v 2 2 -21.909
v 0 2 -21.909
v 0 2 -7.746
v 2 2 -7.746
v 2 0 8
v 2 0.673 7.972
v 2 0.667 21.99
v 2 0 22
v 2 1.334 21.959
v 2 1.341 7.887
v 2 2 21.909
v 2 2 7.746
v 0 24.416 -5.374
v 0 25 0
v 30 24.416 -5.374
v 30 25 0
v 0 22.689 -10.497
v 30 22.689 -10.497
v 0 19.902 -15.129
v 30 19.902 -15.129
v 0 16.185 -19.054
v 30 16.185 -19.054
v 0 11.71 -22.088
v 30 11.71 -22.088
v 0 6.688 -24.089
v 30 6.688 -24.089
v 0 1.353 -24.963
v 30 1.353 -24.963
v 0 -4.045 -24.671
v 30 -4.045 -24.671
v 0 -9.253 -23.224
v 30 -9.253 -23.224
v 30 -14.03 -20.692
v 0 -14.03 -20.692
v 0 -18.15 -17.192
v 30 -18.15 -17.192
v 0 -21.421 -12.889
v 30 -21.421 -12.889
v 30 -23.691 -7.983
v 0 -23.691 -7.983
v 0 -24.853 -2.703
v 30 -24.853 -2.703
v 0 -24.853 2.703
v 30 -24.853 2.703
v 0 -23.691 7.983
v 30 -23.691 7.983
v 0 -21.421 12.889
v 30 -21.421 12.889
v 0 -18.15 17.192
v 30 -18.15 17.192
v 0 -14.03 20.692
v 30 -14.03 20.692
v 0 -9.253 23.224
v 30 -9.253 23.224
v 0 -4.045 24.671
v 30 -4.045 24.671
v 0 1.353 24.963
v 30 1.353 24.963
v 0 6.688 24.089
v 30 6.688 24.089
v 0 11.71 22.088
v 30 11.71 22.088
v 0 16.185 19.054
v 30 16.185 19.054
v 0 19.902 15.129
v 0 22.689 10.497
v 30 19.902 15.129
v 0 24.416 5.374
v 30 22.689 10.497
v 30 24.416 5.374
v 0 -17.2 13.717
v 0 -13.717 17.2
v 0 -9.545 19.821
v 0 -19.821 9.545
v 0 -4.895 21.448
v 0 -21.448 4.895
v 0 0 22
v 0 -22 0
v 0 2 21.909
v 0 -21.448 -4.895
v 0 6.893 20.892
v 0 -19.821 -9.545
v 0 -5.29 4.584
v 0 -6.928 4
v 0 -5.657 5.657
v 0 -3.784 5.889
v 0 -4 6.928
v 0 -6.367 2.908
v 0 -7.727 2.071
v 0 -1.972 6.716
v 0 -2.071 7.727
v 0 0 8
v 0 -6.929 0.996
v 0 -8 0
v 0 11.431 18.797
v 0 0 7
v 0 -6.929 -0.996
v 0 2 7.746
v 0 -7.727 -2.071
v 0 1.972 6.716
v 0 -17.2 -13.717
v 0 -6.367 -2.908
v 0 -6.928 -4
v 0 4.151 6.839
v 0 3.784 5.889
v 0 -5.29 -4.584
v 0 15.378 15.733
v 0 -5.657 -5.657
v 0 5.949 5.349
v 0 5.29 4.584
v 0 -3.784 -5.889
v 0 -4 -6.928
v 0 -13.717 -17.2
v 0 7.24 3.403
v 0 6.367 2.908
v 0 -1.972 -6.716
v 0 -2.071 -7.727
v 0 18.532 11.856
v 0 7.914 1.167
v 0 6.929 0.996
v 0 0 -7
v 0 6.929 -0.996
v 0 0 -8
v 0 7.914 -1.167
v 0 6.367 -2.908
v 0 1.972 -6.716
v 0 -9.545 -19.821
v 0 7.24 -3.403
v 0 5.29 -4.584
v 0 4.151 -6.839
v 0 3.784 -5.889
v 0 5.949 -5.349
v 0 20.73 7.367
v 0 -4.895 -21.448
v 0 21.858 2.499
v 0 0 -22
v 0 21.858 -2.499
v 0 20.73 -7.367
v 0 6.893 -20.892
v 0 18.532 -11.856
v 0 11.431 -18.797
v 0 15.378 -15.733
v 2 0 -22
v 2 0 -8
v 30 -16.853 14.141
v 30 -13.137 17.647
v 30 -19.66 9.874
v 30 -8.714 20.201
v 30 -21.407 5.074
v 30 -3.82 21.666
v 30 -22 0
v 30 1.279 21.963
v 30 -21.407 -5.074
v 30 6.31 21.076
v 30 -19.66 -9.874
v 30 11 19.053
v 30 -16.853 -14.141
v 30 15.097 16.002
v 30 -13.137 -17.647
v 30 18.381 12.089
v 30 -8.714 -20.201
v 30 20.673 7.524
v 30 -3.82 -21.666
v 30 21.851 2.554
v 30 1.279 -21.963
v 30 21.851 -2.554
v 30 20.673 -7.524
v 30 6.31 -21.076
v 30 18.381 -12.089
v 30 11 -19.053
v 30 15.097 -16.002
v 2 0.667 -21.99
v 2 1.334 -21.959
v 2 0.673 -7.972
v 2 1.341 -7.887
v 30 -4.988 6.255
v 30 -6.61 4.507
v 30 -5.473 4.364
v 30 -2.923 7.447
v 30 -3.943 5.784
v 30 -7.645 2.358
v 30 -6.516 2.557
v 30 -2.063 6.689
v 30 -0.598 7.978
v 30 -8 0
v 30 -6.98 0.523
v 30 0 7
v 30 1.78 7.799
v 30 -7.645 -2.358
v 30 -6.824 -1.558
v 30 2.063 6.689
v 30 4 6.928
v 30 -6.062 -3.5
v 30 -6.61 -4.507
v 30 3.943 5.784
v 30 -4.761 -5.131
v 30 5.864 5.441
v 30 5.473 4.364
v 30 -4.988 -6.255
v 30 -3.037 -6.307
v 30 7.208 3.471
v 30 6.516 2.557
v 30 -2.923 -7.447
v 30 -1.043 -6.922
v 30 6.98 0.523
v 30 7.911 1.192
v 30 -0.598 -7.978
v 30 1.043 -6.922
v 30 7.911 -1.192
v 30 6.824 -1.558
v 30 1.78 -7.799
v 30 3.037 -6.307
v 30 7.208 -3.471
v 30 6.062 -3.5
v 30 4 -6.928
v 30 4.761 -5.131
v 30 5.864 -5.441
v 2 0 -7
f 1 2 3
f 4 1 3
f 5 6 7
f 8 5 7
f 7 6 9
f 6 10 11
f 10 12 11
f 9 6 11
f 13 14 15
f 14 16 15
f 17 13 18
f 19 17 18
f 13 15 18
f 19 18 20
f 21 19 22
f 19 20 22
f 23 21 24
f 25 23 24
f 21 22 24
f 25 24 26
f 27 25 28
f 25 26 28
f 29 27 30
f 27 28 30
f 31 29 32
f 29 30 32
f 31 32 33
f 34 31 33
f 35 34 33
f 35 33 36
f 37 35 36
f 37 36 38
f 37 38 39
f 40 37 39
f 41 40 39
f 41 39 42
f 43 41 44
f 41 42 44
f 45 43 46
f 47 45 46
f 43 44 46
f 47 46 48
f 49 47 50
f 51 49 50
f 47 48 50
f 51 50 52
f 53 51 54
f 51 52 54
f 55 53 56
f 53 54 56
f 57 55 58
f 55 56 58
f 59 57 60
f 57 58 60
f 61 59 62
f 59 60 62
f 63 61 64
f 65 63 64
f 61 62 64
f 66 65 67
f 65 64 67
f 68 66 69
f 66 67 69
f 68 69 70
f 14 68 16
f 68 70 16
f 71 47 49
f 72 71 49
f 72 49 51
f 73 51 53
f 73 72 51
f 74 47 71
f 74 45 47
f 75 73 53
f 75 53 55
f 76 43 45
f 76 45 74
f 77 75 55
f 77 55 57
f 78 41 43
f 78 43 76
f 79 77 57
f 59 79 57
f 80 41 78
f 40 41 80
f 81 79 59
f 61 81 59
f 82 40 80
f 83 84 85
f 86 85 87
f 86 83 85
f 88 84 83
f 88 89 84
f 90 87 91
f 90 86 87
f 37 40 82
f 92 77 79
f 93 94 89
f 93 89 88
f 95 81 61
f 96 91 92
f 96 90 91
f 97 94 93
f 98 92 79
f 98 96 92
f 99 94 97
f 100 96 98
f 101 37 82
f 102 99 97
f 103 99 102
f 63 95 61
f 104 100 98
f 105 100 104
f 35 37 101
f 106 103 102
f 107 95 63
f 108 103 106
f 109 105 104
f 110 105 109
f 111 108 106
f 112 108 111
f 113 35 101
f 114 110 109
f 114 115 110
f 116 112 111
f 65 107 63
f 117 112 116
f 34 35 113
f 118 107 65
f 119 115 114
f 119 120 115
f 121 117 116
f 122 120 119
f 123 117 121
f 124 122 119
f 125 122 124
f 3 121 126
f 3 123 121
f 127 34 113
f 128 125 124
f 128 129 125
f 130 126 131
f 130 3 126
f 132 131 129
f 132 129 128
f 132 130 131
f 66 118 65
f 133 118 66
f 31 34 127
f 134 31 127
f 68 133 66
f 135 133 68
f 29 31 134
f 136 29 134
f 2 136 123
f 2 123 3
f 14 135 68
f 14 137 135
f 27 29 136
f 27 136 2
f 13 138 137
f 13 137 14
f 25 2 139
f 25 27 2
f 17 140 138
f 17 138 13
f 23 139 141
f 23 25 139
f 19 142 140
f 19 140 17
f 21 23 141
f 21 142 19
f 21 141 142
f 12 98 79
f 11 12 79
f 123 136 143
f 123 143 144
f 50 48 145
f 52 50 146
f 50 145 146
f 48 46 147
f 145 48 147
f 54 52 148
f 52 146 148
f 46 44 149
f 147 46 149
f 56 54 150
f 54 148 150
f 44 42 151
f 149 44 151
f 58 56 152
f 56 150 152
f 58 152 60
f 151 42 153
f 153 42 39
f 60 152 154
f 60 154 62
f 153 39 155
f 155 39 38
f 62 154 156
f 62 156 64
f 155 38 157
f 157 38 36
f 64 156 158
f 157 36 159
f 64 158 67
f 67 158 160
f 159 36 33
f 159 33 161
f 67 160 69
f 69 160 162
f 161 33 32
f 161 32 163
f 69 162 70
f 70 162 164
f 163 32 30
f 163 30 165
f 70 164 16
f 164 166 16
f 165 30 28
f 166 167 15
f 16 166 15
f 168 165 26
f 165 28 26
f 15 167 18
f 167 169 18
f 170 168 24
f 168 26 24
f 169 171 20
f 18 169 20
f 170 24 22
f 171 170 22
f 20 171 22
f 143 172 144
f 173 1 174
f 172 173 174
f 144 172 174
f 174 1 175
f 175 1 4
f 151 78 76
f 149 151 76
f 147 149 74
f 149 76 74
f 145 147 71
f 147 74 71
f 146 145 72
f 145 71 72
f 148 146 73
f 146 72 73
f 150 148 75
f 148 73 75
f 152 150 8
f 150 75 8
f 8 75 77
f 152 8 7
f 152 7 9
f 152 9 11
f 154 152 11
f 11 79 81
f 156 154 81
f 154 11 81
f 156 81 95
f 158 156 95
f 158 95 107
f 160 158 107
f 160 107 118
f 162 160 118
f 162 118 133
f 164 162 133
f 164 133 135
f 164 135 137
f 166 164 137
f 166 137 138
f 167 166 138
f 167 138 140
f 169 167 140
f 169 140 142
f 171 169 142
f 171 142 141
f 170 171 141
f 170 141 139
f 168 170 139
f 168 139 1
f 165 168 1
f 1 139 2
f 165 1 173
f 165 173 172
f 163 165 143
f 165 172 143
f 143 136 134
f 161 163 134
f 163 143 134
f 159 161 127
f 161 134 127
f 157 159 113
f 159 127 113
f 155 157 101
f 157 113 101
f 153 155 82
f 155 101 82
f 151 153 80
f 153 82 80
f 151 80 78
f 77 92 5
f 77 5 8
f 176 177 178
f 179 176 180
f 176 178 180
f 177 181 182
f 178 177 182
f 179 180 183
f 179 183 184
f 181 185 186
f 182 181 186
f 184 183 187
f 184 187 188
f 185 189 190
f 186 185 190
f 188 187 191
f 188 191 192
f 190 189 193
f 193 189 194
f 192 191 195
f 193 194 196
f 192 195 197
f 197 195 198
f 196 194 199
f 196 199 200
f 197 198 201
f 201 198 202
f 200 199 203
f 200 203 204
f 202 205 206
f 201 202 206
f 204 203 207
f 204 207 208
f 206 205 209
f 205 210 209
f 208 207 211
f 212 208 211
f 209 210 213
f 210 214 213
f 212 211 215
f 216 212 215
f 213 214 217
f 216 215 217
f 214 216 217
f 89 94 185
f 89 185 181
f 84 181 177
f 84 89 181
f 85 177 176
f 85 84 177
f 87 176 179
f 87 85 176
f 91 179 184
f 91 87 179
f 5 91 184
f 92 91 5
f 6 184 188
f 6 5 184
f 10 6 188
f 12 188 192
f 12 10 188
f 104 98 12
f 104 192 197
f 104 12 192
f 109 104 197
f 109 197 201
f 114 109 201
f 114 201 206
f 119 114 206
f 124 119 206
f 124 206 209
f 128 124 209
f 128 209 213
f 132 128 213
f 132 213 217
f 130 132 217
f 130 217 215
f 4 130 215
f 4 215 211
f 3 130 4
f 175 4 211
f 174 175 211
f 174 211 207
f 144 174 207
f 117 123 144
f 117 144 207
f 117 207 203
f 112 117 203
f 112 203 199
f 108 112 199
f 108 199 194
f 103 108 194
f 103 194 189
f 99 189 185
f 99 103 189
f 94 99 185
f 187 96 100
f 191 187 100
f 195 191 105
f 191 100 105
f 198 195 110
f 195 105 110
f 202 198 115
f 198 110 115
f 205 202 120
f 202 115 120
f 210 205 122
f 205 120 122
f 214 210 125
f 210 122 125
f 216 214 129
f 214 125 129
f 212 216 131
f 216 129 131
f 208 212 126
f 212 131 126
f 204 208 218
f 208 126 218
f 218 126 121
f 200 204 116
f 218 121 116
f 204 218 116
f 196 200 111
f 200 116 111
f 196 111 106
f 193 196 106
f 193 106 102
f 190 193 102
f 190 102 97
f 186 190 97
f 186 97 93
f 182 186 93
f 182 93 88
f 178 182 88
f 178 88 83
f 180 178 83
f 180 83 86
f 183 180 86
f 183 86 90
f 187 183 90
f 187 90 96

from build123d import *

# Parameters (mm, degrees)
ESBO_O1_W                = 30
ESBO_O1_H                = 25
ESBO_O2_R                = 7
CORTE_EXTRUS_O1_DEPTH    = 47.368092477
ESBO_O5_R                = 22
ESBO_O5_R_2              = 8
CORTE_EXTRUS_O3_DEPTH    = 47.368092477
ESBO_O6_W                = 15
ESBO_O6_H                = 2
RESSALTO_EXTRUS_O2_DEPTH = 2


with BuildPart() as part:
    # Esboço1 → Revolução1 (revolve)
    with BuildSketch(Plane.XY, mode=Mode.PRIVATE) as revolu_o1_sk:
        with Locations((15, -12.5)):
            Rectangle(ESBO_O1_W, ESBO_O1_H)
    revolve(revolu_o1_sk.sketch.rotate(Axis((30, 0, 0), (-1, 0, 0)), 180), axis=Axis((30, 0, 0), (-1, 0, 0)))

    # Esboço2 → Corte-extrusão1 (cut, through all)
    with BuildSketch(Plane.ZY):
        Circle(ESBO_O2_R)
    extrude(amount=-CORTE_EXTRUS_O1_DEPTH, mode=Mode.SUBTRACT)

    # Esboço5 → Corte-extrusão3 (cut, through all)
    with BuildSketch(Plane.ZY):
        with Locations(Location((0, 0, 0), (0, 0, 270))):
            Circle(ESBO_O5_R)
        with Locations(Location((0, 0, 0), (0, 0, 270))):
            Circle(ESBO_O5_R_2, mode=Mode.SUBTRACT)
    extrude(amount=-CORTE_EXTRUS_O3_DEPTH, mode=Mode.SUBTRACT)


with BuildPart() as corte_extrus_o3_piece_1:
    # of the separate pieces the step leaves, piece 1, a body of its own (corte_extrus_o3_pieces)
    add(part.part.solids().sort_by_distance((0, 25, 0))[0])



with BuildPart() as corte_extrus_o3_piece_2:
    # of the separate pieces the step leaves, piece 2, a body of its own (corte_extrus_o3_pieces)
    add(part.part.solids().sort_by_distance((0, -8, 0))[0])


with BuildPart() as corte_extrus_o3_piece_1_1:
    add(corte_extrus_o3_piece_1.part)

    add(corte_extrus_o3_piece_2.part)  # Ressalto-extrusão2 merges Corte-extrusão3 piece 2
    # Esboço6 → Ressalto-extrusão2 (add)
    with BuildSketch(Plane.ZY):
        with Locations((-14.5, 1)):
            Rectangle(ESBO_O6_W, ESBO_O6_H)
        with Locations((14.5, 1)):
            Rectangle(ESBO_O6_W, ESBO_O6_H)
    extrude(amount=-RESSALTO_EXTRUS_O2_DEPTH)


solid = corte_extrus_o3_piece_1_1.part
